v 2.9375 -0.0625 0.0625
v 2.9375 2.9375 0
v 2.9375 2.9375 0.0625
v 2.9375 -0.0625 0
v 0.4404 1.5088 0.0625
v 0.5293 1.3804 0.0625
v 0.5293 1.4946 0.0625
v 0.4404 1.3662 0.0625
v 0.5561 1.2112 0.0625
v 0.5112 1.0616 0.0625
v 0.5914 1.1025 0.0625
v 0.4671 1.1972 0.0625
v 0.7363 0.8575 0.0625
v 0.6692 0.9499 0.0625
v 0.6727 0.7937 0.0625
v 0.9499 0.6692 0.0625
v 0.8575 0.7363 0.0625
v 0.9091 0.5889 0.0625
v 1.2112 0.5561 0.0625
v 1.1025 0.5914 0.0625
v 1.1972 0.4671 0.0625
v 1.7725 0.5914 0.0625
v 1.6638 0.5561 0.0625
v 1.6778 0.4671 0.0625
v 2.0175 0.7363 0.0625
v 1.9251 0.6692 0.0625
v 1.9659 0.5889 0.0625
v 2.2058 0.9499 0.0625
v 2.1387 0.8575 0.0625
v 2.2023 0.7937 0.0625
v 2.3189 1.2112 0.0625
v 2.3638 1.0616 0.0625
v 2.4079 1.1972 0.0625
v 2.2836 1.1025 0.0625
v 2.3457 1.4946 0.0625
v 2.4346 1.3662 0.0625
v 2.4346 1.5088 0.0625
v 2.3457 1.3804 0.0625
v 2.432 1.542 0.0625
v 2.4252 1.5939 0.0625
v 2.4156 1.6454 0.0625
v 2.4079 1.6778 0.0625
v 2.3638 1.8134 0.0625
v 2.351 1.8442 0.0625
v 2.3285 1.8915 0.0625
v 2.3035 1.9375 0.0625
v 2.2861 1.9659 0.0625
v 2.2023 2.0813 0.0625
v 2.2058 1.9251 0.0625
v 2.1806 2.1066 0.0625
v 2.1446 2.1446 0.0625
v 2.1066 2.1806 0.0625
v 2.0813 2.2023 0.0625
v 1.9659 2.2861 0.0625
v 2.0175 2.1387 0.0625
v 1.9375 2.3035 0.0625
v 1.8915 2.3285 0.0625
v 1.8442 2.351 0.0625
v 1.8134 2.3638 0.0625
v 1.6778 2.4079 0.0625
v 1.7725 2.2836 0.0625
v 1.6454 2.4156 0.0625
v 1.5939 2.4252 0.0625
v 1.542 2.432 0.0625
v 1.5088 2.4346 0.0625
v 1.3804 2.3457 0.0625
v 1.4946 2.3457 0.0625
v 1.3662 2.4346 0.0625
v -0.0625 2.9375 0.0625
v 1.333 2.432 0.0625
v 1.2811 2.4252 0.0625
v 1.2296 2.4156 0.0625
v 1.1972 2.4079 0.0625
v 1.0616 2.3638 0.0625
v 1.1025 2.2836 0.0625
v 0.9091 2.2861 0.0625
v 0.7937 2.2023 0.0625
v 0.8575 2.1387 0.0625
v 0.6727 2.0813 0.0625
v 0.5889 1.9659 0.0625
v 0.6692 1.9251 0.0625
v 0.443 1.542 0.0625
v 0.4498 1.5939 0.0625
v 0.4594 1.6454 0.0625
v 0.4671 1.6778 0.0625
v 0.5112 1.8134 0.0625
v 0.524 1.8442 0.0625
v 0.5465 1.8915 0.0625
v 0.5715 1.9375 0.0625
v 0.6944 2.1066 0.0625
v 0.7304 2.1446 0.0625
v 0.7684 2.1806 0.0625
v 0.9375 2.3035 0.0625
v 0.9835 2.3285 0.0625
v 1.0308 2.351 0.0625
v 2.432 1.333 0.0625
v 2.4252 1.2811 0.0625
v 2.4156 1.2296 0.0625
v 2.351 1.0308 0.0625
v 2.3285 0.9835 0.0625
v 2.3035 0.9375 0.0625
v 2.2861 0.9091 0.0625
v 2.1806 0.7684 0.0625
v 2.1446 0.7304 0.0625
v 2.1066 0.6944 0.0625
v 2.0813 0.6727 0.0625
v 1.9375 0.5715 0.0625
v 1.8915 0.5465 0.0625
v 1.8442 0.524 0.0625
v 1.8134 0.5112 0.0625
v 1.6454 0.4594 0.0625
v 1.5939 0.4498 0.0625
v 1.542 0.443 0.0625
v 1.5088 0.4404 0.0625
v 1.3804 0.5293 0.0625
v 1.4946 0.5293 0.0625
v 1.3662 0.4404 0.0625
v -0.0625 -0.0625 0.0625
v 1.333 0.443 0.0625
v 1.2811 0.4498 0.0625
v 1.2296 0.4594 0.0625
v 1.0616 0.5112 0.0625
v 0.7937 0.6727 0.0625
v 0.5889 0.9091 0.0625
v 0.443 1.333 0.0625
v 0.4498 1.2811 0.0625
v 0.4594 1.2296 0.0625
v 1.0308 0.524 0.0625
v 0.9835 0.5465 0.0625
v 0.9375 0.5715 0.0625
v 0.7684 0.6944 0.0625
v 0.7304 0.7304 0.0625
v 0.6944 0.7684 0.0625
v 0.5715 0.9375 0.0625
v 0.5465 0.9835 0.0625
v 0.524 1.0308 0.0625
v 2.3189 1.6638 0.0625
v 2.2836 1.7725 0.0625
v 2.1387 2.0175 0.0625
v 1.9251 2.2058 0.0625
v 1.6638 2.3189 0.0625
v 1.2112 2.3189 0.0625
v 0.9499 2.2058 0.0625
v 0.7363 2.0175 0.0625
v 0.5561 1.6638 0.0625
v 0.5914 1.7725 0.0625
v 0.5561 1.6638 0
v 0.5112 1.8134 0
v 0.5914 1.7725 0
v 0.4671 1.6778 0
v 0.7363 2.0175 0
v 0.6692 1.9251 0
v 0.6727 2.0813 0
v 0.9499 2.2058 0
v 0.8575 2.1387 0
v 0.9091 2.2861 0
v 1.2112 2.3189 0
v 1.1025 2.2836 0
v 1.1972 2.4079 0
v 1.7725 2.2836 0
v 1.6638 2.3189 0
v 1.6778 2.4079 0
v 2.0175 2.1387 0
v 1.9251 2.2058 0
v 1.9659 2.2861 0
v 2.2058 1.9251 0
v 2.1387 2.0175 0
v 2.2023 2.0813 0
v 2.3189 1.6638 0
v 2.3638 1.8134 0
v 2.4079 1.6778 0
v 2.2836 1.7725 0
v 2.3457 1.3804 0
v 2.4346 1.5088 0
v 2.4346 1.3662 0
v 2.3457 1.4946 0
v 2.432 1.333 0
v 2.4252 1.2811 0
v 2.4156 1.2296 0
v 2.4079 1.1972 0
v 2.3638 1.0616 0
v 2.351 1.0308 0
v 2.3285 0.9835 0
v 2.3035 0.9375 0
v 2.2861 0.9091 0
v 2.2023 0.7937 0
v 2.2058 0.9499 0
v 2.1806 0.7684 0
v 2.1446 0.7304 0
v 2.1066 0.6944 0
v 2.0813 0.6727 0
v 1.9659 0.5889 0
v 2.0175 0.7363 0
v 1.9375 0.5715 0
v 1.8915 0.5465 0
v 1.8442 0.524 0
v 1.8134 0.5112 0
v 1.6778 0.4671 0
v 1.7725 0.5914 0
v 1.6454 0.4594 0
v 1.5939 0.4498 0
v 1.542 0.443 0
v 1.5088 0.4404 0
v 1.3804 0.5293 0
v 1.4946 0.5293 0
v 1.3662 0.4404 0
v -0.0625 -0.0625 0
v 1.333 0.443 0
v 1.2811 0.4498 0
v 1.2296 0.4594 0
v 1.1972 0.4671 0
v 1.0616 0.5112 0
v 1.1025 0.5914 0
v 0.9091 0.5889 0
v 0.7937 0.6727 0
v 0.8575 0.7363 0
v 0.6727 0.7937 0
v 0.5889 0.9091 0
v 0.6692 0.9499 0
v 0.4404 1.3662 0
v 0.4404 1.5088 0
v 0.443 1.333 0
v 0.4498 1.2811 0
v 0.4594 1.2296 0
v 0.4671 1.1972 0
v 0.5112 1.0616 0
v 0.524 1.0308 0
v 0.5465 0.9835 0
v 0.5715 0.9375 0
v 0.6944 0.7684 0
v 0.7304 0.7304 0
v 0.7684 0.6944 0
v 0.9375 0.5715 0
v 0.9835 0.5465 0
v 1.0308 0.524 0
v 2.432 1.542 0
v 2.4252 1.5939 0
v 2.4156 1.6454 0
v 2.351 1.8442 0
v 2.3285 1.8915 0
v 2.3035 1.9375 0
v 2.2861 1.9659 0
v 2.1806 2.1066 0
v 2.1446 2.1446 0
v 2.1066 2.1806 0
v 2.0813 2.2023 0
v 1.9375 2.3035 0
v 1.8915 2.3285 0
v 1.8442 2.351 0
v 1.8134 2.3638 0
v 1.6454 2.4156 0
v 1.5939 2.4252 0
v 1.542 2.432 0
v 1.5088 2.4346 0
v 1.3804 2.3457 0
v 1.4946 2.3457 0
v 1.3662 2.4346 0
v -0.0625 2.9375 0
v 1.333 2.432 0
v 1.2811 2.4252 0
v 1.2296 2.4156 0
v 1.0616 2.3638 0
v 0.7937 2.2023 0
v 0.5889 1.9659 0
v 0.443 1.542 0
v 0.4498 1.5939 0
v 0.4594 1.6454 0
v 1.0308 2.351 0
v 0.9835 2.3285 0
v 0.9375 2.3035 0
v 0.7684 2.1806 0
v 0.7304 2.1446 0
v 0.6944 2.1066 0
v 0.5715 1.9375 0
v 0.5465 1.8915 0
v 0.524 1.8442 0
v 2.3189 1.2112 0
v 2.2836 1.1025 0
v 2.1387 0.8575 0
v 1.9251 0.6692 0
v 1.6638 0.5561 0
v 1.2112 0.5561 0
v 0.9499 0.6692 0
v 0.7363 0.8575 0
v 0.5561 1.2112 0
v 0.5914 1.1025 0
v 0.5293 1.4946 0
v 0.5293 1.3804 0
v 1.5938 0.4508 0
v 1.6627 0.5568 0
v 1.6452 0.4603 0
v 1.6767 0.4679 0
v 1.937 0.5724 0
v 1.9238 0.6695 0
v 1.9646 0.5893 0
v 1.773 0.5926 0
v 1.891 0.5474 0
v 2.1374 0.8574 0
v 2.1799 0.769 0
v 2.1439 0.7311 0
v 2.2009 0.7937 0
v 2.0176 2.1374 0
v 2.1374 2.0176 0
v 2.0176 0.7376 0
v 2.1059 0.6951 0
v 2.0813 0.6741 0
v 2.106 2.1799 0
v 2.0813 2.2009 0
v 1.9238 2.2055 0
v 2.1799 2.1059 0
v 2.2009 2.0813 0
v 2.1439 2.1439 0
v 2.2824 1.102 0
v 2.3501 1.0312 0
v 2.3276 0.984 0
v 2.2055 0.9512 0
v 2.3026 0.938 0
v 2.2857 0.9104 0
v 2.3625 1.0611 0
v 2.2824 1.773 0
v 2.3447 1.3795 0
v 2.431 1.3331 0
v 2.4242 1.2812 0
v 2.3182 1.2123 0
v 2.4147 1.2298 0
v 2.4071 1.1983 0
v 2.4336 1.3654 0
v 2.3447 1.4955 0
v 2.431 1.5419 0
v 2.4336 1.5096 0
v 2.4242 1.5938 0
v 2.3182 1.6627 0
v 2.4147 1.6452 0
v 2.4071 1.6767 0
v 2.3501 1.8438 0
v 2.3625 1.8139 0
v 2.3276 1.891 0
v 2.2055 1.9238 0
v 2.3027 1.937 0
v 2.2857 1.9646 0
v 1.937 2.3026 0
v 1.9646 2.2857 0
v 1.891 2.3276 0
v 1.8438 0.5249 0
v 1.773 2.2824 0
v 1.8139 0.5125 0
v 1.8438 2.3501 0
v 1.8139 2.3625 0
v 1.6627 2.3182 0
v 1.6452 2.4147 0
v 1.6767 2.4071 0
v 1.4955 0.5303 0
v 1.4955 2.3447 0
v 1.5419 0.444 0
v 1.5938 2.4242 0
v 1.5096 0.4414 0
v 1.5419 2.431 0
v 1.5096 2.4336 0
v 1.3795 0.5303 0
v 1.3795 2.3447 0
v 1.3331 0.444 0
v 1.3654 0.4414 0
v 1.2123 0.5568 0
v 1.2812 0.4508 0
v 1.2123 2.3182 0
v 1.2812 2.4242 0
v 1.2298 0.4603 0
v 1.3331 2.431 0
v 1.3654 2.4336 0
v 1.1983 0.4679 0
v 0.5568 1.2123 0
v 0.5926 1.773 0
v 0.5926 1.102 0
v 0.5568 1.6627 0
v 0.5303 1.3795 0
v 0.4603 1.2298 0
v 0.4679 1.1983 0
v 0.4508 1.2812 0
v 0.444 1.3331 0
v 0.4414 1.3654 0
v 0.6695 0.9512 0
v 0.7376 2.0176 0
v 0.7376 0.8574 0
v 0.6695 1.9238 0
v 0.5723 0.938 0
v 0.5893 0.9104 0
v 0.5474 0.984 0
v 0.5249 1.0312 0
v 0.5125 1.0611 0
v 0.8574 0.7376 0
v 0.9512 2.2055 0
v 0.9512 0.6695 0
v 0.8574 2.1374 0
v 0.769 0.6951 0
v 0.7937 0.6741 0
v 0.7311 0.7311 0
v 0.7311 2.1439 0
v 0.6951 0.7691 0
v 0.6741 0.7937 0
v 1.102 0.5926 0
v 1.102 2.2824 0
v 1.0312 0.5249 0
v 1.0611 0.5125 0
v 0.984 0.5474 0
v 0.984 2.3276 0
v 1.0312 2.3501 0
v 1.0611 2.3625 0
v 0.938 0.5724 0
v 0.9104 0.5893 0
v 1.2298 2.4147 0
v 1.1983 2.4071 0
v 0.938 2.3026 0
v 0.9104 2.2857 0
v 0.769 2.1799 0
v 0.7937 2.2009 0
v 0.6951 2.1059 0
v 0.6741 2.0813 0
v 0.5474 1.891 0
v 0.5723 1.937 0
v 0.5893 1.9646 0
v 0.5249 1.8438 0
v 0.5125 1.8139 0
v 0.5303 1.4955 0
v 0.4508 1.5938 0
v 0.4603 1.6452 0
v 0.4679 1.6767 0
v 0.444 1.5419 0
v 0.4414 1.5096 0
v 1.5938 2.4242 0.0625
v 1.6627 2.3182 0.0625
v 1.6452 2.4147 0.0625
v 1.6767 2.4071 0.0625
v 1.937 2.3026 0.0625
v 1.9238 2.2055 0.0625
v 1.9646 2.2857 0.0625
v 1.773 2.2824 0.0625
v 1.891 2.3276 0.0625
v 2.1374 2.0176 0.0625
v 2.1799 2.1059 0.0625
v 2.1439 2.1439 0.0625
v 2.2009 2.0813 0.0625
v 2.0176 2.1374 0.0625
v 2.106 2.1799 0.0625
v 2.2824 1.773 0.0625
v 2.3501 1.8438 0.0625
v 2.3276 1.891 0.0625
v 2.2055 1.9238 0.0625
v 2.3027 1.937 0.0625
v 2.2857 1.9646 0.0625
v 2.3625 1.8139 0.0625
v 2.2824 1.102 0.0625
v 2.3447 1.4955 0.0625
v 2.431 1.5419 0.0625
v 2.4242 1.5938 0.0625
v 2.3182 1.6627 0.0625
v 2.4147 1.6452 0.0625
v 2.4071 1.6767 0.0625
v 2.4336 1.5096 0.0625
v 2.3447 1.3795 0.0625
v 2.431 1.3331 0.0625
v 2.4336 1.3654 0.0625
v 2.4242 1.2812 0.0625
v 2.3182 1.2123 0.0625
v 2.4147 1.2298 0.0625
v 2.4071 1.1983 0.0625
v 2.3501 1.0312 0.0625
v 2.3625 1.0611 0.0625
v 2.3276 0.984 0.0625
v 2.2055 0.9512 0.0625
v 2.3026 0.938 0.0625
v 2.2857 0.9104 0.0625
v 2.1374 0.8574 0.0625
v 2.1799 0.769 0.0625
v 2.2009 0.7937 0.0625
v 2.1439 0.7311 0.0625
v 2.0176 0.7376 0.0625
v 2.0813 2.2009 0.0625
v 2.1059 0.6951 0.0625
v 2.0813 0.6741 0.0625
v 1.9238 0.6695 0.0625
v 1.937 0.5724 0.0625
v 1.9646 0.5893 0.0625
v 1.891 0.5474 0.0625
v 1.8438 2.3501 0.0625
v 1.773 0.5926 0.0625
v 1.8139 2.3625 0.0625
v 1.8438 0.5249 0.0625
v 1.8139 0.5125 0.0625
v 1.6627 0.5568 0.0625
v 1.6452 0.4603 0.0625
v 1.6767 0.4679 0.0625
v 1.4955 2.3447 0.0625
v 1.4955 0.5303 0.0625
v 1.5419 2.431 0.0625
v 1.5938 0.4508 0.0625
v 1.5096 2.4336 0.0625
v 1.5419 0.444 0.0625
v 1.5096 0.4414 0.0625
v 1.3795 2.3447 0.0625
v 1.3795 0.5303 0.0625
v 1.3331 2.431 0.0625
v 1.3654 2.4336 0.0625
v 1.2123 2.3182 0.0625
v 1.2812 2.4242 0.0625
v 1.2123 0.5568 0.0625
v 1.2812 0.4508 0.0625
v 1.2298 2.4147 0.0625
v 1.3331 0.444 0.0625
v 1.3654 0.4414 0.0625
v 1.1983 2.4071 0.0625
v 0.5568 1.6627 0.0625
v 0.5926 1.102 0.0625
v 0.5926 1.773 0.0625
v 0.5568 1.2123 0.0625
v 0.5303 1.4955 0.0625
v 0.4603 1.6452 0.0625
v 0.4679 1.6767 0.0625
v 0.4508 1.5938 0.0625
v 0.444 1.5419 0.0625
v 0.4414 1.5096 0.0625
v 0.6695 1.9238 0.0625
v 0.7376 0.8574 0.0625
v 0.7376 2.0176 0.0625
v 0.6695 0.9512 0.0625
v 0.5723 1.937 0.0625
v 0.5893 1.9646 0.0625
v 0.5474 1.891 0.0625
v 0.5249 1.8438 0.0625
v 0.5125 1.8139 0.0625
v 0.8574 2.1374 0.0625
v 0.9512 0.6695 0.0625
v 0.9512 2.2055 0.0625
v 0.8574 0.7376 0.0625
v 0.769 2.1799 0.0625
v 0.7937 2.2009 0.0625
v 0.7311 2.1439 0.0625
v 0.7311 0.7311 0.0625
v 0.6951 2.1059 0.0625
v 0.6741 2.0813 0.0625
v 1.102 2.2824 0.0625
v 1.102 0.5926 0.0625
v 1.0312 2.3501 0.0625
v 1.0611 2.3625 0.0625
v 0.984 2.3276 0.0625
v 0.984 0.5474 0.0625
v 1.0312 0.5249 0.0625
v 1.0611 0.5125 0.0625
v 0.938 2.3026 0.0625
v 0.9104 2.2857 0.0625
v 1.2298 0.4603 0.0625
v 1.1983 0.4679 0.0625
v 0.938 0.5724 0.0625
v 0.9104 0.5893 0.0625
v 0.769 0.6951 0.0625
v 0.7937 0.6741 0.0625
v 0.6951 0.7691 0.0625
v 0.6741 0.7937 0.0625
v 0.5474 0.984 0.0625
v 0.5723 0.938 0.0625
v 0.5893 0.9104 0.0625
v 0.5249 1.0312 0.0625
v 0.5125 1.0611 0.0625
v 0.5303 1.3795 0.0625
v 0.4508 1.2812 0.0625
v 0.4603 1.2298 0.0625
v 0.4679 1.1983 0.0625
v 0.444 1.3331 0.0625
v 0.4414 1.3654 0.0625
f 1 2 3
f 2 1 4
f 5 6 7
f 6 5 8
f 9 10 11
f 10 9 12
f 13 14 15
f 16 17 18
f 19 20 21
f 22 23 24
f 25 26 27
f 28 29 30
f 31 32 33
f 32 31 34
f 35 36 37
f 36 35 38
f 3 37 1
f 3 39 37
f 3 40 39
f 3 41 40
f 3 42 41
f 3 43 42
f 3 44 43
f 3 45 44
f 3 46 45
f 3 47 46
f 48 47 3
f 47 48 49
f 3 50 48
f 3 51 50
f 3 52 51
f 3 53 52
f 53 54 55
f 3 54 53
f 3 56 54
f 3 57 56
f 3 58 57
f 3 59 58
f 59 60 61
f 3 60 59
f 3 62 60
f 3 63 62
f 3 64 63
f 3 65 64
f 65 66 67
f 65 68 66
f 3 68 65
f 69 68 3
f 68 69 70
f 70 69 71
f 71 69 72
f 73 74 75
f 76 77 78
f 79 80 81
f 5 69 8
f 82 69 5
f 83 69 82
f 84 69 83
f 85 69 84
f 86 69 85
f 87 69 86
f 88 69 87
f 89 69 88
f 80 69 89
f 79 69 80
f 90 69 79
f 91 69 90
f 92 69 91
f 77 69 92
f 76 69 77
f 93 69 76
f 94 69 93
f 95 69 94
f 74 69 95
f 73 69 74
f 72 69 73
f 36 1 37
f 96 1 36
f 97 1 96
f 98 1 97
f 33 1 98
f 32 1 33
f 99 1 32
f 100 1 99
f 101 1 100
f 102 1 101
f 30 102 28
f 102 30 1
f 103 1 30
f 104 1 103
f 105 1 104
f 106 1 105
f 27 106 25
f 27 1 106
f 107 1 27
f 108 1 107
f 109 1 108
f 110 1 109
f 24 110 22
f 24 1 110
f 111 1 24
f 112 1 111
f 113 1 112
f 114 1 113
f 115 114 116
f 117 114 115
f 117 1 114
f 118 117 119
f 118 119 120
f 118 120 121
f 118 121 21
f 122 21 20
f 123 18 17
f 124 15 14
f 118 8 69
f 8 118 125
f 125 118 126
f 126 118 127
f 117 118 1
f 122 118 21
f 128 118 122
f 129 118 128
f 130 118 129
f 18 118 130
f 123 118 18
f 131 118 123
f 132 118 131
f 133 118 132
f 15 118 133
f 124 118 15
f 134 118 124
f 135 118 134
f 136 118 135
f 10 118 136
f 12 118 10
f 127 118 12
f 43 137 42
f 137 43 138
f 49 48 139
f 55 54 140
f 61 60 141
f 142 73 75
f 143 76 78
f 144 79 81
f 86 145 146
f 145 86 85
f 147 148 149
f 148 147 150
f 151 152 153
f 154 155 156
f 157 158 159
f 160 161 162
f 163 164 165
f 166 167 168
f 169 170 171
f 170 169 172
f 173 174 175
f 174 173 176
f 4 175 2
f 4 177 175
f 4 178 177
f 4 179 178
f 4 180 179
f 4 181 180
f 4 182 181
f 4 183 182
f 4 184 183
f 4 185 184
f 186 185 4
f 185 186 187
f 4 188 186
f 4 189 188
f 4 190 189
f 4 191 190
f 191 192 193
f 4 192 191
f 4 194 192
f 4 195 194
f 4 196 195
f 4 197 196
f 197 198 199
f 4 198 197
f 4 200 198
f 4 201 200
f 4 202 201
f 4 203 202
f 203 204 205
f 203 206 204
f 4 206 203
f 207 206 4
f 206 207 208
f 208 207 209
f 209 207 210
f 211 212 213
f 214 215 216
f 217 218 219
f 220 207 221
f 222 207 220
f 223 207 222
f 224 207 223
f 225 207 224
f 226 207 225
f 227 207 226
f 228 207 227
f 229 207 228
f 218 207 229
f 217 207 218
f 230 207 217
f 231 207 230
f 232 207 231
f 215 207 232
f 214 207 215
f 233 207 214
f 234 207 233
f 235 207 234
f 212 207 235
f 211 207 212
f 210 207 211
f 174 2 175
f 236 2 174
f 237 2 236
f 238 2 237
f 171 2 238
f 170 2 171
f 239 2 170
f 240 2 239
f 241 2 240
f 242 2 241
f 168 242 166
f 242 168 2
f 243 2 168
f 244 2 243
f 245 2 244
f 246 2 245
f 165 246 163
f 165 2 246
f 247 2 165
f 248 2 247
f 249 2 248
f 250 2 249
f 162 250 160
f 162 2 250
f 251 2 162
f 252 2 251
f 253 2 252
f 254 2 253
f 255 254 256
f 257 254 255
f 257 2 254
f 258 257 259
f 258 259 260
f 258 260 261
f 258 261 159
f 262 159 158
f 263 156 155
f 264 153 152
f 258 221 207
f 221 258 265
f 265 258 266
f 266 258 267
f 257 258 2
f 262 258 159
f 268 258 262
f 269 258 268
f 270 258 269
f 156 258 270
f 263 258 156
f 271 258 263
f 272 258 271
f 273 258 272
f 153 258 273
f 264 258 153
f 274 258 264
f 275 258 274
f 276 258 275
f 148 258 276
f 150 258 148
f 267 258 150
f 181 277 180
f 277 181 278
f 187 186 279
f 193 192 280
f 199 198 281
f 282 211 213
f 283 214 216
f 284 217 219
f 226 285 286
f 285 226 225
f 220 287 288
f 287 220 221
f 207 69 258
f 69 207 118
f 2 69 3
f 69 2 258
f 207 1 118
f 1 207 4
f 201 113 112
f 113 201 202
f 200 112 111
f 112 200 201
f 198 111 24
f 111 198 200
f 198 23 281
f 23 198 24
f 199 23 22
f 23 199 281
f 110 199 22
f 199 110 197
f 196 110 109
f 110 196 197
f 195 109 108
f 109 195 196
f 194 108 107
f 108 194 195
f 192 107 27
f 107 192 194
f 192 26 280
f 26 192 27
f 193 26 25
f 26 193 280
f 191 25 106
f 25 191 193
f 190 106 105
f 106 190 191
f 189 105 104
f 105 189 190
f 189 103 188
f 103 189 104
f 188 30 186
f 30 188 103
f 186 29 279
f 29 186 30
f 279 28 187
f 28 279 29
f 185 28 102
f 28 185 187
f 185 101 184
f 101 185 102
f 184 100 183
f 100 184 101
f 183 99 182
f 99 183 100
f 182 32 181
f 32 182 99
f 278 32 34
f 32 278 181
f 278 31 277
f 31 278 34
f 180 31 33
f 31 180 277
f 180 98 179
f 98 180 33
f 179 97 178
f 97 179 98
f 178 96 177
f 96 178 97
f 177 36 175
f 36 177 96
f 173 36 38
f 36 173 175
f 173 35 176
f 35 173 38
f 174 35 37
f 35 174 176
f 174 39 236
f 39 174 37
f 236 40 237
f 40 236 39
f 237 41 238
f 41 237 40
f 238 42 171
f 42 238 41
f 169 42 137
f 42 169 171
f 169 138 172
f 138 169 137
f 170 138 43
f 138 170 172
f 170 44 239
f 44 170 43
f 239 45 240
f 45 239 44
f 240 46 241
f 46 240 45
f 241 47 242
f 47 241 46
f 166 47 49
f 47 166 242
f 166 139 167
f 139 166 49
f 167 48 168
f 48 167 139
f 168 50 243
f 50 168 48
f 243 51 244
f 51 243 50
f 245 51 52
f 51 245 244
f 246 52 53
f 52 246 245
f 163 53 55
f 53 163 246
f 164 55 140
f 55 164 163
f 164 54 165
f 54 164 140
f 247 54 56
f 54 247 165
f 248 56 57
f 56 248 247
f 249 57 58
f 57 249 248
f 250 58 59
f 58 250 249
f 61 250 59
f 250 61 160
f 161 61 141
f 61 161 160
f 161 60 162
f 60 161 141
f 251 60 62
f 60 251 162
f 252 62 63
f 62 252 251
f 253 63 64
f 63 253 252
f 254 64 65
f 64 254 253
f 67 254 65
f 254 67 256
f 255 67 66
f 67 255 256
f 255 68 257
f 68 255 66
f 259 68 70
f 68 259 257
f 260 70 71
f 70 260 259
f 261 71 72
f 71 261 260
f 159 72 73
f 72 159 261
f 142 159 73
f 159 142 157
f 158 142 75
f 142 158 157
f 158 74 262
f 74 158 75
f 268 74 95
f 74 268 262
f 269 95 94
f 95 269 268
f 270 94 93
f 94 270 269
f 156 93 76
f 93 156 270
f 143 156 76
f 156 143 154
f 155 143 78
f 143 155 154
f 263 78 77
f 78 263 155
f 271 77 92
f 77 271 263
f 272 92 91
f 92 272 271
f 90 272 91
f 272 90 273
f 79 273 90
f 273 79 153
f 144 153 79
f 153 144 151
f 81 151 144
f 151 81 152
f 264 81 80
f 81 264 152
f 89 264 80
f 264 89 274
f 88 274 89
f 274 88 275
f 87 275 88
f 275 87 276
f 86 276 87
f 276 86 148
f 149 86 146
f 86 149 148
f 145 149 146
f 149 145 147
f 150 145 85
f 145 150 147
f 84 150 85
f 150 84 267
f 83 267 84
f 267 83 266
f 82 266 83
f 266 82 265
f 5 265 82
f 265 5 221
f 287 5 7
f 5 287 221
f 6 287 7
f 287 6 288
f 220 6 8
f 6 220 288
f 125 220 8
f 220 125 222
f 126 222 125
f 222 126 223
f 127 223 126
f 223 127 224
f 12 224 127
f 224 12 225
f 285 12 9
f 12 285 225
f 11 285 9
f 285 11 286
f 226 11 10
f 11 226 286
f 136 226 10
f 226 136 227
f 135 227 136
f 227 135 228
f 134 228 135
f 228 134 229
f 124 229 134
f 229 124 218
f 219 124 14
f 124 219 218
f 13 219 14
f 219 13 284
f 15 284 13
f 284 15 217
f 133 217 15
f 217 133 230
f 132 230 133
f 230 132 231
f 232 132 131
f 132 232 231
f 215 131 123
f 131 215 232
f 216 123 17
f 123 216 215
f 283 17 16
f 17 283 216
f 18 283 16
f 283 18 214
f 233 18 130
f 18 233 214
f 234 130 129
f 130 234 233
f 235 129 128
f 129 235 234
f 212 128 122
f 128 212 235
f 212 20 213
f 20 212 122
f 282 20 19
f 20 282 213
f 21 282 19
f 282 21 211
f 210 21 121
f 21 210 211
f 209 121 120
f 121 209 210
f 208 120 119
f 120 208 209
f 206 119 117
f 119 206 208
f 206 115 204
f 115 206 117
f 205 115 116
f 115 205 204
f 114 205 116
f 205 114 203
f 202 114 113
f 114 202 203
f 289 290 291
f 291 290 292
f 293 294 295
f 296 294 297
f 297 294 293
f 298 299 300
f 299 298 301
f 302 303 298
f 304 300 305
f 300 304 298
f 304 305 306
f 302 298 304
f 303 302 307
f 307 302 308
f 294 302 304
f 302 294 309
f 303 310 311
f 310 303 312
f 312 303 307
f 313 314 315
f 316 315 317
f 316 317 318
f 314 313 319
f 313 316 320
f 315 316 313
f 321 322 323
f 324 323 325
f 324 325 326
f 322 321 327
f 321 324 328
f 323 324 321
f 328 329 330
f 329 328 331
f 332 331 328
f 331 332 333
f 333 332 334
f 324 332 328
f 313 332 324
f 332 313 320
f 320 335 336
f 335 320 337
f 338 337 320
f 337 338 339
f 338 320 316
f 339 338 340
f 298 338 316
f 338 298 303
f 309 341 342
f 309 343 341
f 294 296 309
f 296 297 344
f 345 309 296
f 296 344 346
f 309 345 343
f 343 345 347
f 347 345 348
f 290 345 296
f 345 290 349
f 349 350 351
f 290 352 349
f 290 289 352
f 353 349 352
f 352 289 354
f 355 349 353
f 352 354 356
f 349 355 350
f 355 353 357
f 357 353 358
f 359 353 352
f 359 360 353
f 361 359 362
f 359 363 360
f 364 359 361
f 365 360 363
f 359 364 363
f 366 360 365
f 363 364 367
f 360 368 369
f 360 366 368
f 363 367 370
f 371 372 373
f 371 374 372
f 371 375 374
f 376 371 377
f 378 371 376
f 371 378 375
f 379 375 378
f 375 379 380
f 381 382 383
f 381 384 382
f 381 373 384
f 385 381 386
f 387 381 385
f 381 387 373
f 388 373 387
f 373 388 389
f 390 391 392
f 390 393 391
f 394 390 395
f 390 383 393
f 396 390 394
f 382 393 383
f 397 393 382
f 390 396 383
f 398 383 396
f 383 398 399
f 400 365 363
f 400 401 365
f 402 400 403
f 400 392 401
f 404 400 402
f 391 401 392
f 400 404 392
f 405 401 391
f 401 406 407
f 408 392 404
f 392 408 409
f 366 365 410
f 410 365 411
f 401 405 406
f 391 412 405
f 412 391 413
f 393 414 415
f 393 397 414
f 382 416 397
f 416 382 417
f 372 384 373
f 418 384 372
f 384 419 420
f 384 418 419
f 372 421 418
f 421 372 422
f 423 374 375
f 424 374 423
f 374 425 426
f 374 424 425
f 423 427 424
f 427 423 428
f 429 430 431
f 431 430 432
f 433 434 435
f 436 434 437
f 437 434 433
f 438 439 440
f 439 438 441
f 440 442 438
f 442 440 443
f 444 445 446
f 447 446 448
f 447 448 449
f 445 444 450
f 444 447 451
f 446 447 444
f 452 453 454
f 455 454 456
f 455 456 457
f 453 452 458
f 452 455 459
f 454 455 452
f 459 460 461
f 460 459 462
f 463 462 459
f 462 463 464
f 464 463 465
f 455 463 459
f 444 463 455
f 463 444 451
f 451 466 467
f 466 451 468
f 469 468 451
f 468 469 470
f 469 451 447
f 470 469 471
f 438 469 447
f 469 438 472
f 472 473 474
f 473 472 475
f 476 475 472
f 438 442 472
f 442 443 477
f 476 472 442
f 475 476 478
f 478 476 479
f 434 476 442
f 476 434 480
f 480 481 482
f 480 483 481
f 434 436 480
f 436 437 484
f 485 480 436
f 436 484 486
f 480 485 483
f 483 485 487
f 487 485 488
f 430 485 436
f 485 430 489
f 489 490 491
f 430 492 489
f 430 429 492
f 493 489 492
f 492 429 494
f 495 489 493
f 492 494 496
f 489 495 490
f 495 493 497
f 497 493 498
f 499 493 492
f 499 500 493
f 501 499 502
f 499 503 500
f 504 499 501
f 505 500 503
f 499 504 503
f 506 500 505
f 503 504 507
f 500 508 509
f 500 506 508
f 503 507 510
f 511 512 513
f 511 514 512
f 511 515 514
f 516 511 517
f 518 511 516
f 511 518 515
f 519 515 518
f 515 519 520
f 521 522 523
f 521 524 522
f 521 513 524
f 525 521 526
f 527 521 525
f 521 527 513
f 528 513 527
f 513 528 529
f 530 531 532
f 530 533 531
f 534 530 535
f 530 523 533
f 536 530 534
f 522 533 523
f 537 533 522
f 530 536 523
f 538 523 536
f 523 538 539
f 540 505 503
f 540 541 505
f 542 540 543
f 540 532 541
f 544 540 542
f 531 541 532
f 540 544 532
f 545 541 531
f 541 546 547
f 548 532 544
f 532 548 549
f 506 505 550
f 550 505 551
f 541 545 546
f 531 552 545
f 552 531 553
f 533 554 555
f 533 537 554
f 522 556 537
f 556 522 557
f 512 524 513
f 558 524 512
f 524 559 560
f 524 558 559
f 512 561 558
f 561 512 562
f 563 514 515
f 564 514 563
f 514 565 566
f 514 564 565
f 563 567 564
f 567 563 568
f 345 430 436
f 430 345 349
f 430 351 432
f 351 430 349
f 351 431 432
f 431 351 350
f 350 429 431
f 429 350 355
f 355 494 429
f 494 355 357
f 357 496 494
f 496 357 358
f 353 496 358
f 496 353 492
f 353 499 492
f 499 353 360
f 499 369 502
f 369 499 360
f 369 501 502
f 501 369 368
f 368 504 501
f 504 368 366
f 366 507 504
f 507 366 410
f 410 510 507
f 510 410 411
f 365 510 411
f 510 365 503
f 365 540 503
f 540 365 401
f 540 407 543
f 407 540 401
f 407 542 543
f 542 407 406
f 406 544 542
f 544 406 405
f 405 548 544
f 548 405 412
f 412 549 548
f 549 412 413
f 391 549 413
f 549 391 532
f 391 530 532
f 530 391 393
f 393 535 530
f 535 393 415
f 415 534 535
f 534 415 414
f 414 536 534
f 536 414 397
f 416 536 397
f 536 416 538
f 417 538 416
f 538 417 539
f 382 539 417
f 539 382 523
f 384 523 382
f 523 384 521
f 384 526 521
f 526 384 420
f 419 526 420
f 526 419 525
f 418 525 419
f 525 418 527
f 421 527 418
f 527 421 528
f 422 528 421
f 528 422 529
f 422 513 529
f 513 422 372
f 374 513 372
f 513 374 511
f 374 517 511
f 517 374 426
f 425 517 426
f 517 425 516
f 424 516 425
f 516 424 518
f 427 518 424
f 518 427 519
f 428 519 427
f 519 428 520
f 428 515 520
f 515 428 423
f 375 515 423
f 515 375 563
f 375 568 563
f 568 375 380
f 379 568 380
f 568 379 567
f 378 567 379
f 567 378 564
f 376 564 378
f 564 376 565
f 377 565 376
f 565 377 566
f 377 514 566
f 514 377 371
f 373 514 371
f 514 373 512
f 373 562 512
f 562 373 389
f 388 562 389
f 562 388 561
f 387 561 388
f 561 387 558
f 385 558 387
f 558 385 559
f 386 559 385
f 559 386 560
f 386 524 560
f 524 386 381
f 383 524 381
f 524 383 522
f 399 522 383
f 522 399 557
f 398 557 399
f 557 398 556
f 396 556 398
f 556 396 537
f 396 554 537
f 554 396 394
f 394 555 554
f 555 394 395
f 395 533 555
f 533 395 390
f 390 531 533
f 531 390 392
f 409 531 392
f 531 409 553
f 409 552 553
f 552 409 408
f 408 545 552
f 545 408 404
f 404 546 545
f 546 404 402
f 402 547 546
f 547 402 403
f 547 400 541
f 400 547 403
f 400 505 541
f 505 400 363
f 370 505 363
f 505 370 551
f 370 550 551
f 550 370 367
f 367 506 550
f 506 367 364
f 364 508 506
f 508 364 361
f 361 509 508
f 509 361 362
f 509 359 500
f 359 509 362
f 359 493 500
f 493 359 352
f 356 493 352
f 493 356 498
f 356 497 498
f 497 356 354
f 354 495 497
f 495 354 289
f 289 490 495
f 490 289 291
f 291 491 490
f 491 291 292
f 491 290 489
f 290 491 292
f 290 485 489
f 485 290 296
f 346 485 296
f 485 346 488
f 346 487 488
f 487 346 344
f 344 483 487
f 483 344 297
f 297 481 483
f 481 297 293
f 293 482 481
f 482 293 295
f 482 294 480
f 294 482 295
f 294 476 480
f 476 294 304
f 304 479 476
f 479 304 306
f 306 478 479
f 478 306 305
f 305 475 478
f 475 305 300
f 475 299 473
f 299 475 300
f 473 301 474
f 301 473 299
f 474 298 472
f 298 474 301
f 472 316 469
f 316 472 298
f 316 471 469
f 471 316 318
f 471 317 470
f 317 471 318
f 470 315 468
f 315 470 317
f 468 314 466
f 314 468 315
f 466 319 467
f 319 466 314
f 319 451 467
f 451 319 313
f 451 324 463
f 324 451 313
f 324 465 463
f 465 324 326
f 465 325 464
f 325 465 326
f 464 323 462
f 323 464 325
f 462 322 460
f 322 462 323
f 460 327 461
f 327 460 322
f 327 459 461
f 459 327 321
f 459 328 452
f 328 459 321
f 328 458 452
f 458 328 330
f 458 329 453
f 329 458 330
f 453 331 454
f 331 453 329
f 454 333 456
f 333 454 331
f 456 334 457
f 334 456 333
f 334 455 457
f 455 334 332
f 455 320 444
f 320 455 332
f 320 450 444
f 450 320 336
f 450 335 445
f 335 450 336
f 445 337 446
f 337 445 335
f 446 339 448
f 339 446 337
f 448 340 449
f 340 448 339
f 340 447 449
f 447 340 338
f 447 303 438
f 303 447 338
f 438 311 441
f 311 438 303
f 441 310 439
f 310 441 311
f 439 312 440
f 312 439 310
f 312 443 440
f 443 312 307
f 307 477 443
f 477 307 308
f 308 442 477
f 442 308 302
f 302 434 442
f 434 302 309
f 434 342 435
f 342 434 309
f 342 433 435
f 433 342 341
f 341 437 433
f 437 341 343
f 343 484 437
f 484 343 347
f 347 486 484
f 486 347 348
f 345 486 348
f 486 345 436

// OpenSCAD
// file: modules.scad
// modules.scad — shared tile-building blocks: plate, rivets, edge ID marks,
// and the common plate/hole dimensional constants used by every tile.
// Units: inches
//
// Usage — must be `include`, not `use`, and the include line must come
// before any code in the caller that references plate_w/plate_d/plate_h/
// frame_w/hole_d/hole_r: a variable defined only inside an included file is
// invisible to code positioned before the include statement.
//   include <modules.scad>
//   plate(["red", undef, "blue", undef, undef, "green"]);
//
// plate(colors) is the main entry point: it builds the complete base tile in
// one call — the frame with edge ID marks, the darkgray plate, and the
// lightgray rivet ring (40 rivets, 10 per side, corners shared). colors is the
// same 6-slot frame_with_id() array described below.
//
// frame_with_id() colors are applied left-to-right (−x to +x), repeated
// identically on all four edges. Bottom and right edges read the array in
// reverse (slot 5-i) so the pattern stays consistent when the tile is flipped.
// Any position left as undef or omitted defaults to black. 6 regions span the
// straight run of each edge (corners always stay solid black). A thin black
// layer covers the marks on the top face; marks are visible from the edge.

plate_w = 2 + 7/8;
plate_d = 2 + 7/8;
plate_h = 1/16;
frame_w = 1/16;
hole_d  = 3/32;
hole_r  = hole_d / 2;

module rivet_holes() {
    spacing_x = plate_w / 10;
    spacing_y = plate_d / 10;
    inset_x   = spacing_x / 2;
    inset_y   = spacing_y / 2;
    for (i = [0:9]) translate([inset_x + i * spacing_x, inset_y,           -1]) cylinder(h = plate_h + 2, r = hole_r, $fn = 20);
    for (i = [0:9]) translate([inset_x + i * spacing_x, plate_d - inset_y, -1]) cylinder(h = plate_h + 2, r = hole_r, $fn = 20);
    for (i = [0:9]) translate([inset_x,           inset_y + i * spacing_y, -1]) cylinder(h = plate_h + 2, r = hole_r, $fn = 20);
    for (i = [0:9]) translate([plate_w - inset_x, inset_y + i * spacing_y, -1]) cylinder(h = plate_h + 2, r = hole_r, $fn = 20);
}

module rivets() {
    spacing_x = plate_w / 10;
    spacing_y = plate_d / 10;
    inset_x   = spacing_x / 2;
    inset_y   = spacing_y / 2;
    color("lightgray") {
        for (i = [0:9]) translate([inset_x + i * spacing_x, inset_y,           0]) cylinder(h = plate_h, r = hole_r, $fn = 20);
        for (i = [0:9]) translate([inset_x + i * spacing_x, plate_d - inset_y, 0]) cylinder(h = plate_h, r = hole_r, $fn = 20);
        for (i = [0:9]) translate([inset_x,           inset_y + i * spacing_y, 0]) cylinder(h = plate_h, r = hole_r, $fn = 20);
        for (i = [0:9]) translate([plate_w - inset_x, inset_y + i * spacing_y, 0]) cylinder(h = plate_h, r = hole_r, $fn = 20);
    }
}

module frame_with_id(colors = []) {
    id_cover = plate_h / 8;
    region_w = plate_w / 6;
    region_d = plate_d / 6;
    mark_h   = plate_h - id_cover;

    color("black")
    difference() {
        translate([-frame_w, -frame_w, 0])
            cube([plate_w + 2 * frame_w, plate_d + 2 * frame_w, plate_h]);
        translate([0, 0, -0.001])
            cube([plate_w, plate_d, plate_h + 0.002]);
        // top/bottom/left/right straight runs only — corners stay solid black
        translate([0, plate_d - 0.001, -0.001])
            cube([plate_w, frame_w + 0.002, plate_h + 0.002]);
        translate([0, -frame_w - 0.001, -0.001])
            cube([plate_w, frame_w + 0.002, plate_h + 0.002]);
        translate([-frame_w - 0.001, 0, -0.001])
            cube([frame_w + 0.002, plate_d, plate_h + 0.002]);
        translate([plate_w - 0.001, 0, -0.001])
            cube([frame_w + 0.002, plate_d, plate_h + 0.002]);
    }

    for (i = [0:5]) {
        c     = (colors[i] != undef) ? colors[i] : "black";

        // top edge
        color(c) translate([i * region_w, plate_d, 0]) cube([region_w, frame_w, mark_h]);
        color("black") translate([i * region_w, plate_d, mark_h]) cube([region_w, frame_w, id_cover]);

        // bottom edge (reversed)
        color(c) translate([(5-i) * region_w, -frame_w, 0]) cube([region_w, frame_w, mark_h]);
        color("black") translate([(5-i) * region_w, -frame_w, mark_h]) cube([region_w, frame_w, id_cover]);

        // left edge
        color(c) translate([-frame_w, i * region_d, 0]) cube([frame_w, region_d, mark_h]);
        color("black") translate([-frame_w, i * region_d, mark_h]) cube([frame_w, region_d, id_cover]);

        // right edge (reversed)
        color(c) translate([plate_w, (5-i) * region_d, 0]) cube([frame_w, region_d, mark_h]);
        color("black") translate([plate_w, (5-i) * region_d, mark_h]) cube([frame_w, region_d, id_cover]);
    }
}

module plate(colors = []) {
    frame_with_id(colors);
    union() {
        difference() {
            color("darkgray") cube([plate_w, plate_d, plate_h]);
            rivet_holes();
        }
        rivets();
    }
}
// main file
// element120-A.scad
// Vortex Portal (Orange) — orange ring with inner fill, dashes, and upward arrow;
// letter "A" marks this variant.
// Units: inches

include <modules.scad>

cx = plate_w / 2;
cy = plate_d / 2;

// Orange ring — same radii as the element100/110 gear ring
ring_r_out = 1.18;
ring_r_in  = 1.00;

// Inward-pointing teeth cut into the ring's inner edge (same technique as element110-2)
ring_n        = 20;
ring_tooth_hw = 4.5;
ring_tooth_f  = 0.80;
ring_tooth_d  = 0.09;   // tooth depth, same as the gear tiles' tooth depth

// Orange dashed arc inside the ring, lower arc (portal intake indicator)
dash_r     = 0.73;
dash_count = 8;
dash_a1    = 205;
dash_a2    = 335;
dash_w     = 0.074;
dash_len   = 0.140;

// Orange upward arrow — bottom unchanged, tip restored to original position
arr_stem_w  = 0.40;
arr_stem_y1 = cy - 0.44;
arr_stem_y2 = cy + 0.20;
arr_head_w  = 0.90;
arr_head_h  = 0.38;

// ── Standard modules ─────────────────────────────────────────────────────────

// ── Ring 2D helpers ───────────────────────────────────────────────────────────

module ring_tooth_2d() {
    r_outer = ring_r_in + ring_tooth_d;
    r_inner = ring_r_in - ring_tooth_d;
    polygon([
        [r_outer * cos(-ring_tooth_hw),               r_outer * sin(-ring_tooth_hw)],
        [r_inner * cos(-ring_tooth_hw * ring_tooth_f), r_inner * sin(-ring_tooth_hw * ring_tooth_f)],
        [r_inner * cos( ring_tooth_hw * ring_tooth_f), r_inner * sin( ring_tooth_hw * ring_tooth_f)],
        [r_outer * cos( ring_tooth_hw),               r_outer * sin( ring_tooth_hw)],
    ]);
}

module ring_2d() {
    circle(r = ring_r_out, $fn = 120);
}

module ring_bore_2d() {
    pitch = 360 / ring_n;
    difference() {
        circle(r = ring_r_in, $fn = 120);
        for (i = [0:ring_n - 1]) rotate([0, 0, i * pitch]) ring_tooth_2d();
    }
}

// ── Ring hole & ring ─────────────────────────────────────────────────────────

module ring_holes() {
    translate([cx, cy, -1])
    linear_extrude(plate_h + 2)
    difference() {
        ring_2d();
        ring_bore_2d();
    }
}

module white_ring() {
    color("orange")
    translate([cx, cy, 0])
    linear_extrude(plate_h)
    difference() {
        ring_2d();
        ring_bore_2d();
    }
}

// ── Inner fill hole & inner fill ─────────────────────────────────────────────

module inner_fill_holes() {
    translate([cx, cy, -1])
    linear_extrude(plate_h + 2)
    ring_bore_2d();
}

module inner_fill() {
    color("lightgray")
    translate([cx, cy, 0])
    linear_extrude(plate_h)
    offset(delta = -0.001) ring_bore_2d();
}

// ── Dash holes & dashes ───────────────────────────────────────────────────────

module dash_holes() {
    span = dash_a2 - dash_a1;
    for (i = [0 : dash_count - 1]) {
        angle = dash_a1 + span * i / (dash_count - 1);
        dx = cx + dash_r * cos(angle);
        dy = cy + dash_r * sin(angle);
        translate([dx, dy, -1])
        rotate([0, 0, angle + 90])
        linear_extrude(plate_h + 2)
        square([dash_w, dash_len], center = true);
    }
}

module white_dashes() {
    span = dash_a2 - dash_a1;
    color("orange") {
        for (i = [0 : dash_count - 1]) {
            angle = dash_a1 + span * i / (dash_count - 1);
            dx = cx + dash_r * cos(angle);
            dy = cy + dash_r * sin(angle);
            translate([dx, dy, 0])
            rotate([0, 0, angle + 90])
            linear_extrude(plate_h)
            square([dash_w, dash_len], center = true);
        }
    }
}

// ── Arrow hole & arrow ────────────────────────────────────────────────────────

module arrow_holes() {
    translate([0, 0, -1])
    linear_extrude(plate_h + 2)
    union() {
        translate([cx - arr_stem_w / 2, arr_stem_y1])
            square([arr_stem_w, arr_stem_y2 - arr_stem_y1]);
        translate([cx, arr_stem_y2])
            polygon([
                [-arr_head_w / 2, 0],
                [ arr_head_w / 2, 0],
                [0, arr_head_h]
            ]);
    }
}

module white_arrow() {
    color("orange")
    linear_extrude(plate_h)
    union() {
        translate([cx - arr_stem_w / 2, arr_stem_y1])
            square([arr_stem_w, arr_stem_y2 - arr_stem_y1]);
        translate([cx, arr_stem_y2])
            polygon([
                [-arr_head_w / 2, 0],
                [ arr_head_w / 2, 0],
                [0, arr_head_h]
            ]);
    }
}

// ── Label hole → label ────────────────────────────────────────────────────────

module label_holes() {
    translate([cx, cy, -1])
    linear_extrude(plate_h + 2)
    text("A", size = .3, halign = "center", valign = "center",
         font = "Liberation Sans:style=Bold");
}

module label() {
    color("white")
    translate([cx, cy, 0])
    linear_extrude(plate_h)
    text("A", size = .3, halign = "center", valign = "center",
         font = "Liberation Sans:style=Bold");
}

// ── Assembly ──────────────────────────────────────────────────────────────────
// Each level: difference() cuts the holes INTO the running assembly,
//             union() then adds the feature that fills those holes.
// Innermost = first step; outermost = last step.

union() {                                           // step 4: add label
    difference() {
        union() {                                   // step 3: add dashes & arrow
            difference() {
                union() {                           // step 2: add inner fill
                    difference() {
                        union() {                   // step 1: add ring
                            difference() {
                                plate([undef, "orange", "orange", "orange", "orange", "orange"]);   // step 0: plate (frame + rivets)
                                ring_holes();               // cut ring holes
                            }
                            white_ring();                   // fill with ring
                        }
                        inner_fill_holes();                 // cut inner fill holes
                    }
                    inner_fill();                           // fill with inner fill
                }
                dash_holes();                               // cut dash holes
                arrow_holes();                               // cut arrow holes
            }
            white_dashes();                                 // fill with dashes
            white_arrow();                                  // fill with arrow
        }
        label_holes();                                      // cut label hole
    }
    label();                                                // fill with label
}
